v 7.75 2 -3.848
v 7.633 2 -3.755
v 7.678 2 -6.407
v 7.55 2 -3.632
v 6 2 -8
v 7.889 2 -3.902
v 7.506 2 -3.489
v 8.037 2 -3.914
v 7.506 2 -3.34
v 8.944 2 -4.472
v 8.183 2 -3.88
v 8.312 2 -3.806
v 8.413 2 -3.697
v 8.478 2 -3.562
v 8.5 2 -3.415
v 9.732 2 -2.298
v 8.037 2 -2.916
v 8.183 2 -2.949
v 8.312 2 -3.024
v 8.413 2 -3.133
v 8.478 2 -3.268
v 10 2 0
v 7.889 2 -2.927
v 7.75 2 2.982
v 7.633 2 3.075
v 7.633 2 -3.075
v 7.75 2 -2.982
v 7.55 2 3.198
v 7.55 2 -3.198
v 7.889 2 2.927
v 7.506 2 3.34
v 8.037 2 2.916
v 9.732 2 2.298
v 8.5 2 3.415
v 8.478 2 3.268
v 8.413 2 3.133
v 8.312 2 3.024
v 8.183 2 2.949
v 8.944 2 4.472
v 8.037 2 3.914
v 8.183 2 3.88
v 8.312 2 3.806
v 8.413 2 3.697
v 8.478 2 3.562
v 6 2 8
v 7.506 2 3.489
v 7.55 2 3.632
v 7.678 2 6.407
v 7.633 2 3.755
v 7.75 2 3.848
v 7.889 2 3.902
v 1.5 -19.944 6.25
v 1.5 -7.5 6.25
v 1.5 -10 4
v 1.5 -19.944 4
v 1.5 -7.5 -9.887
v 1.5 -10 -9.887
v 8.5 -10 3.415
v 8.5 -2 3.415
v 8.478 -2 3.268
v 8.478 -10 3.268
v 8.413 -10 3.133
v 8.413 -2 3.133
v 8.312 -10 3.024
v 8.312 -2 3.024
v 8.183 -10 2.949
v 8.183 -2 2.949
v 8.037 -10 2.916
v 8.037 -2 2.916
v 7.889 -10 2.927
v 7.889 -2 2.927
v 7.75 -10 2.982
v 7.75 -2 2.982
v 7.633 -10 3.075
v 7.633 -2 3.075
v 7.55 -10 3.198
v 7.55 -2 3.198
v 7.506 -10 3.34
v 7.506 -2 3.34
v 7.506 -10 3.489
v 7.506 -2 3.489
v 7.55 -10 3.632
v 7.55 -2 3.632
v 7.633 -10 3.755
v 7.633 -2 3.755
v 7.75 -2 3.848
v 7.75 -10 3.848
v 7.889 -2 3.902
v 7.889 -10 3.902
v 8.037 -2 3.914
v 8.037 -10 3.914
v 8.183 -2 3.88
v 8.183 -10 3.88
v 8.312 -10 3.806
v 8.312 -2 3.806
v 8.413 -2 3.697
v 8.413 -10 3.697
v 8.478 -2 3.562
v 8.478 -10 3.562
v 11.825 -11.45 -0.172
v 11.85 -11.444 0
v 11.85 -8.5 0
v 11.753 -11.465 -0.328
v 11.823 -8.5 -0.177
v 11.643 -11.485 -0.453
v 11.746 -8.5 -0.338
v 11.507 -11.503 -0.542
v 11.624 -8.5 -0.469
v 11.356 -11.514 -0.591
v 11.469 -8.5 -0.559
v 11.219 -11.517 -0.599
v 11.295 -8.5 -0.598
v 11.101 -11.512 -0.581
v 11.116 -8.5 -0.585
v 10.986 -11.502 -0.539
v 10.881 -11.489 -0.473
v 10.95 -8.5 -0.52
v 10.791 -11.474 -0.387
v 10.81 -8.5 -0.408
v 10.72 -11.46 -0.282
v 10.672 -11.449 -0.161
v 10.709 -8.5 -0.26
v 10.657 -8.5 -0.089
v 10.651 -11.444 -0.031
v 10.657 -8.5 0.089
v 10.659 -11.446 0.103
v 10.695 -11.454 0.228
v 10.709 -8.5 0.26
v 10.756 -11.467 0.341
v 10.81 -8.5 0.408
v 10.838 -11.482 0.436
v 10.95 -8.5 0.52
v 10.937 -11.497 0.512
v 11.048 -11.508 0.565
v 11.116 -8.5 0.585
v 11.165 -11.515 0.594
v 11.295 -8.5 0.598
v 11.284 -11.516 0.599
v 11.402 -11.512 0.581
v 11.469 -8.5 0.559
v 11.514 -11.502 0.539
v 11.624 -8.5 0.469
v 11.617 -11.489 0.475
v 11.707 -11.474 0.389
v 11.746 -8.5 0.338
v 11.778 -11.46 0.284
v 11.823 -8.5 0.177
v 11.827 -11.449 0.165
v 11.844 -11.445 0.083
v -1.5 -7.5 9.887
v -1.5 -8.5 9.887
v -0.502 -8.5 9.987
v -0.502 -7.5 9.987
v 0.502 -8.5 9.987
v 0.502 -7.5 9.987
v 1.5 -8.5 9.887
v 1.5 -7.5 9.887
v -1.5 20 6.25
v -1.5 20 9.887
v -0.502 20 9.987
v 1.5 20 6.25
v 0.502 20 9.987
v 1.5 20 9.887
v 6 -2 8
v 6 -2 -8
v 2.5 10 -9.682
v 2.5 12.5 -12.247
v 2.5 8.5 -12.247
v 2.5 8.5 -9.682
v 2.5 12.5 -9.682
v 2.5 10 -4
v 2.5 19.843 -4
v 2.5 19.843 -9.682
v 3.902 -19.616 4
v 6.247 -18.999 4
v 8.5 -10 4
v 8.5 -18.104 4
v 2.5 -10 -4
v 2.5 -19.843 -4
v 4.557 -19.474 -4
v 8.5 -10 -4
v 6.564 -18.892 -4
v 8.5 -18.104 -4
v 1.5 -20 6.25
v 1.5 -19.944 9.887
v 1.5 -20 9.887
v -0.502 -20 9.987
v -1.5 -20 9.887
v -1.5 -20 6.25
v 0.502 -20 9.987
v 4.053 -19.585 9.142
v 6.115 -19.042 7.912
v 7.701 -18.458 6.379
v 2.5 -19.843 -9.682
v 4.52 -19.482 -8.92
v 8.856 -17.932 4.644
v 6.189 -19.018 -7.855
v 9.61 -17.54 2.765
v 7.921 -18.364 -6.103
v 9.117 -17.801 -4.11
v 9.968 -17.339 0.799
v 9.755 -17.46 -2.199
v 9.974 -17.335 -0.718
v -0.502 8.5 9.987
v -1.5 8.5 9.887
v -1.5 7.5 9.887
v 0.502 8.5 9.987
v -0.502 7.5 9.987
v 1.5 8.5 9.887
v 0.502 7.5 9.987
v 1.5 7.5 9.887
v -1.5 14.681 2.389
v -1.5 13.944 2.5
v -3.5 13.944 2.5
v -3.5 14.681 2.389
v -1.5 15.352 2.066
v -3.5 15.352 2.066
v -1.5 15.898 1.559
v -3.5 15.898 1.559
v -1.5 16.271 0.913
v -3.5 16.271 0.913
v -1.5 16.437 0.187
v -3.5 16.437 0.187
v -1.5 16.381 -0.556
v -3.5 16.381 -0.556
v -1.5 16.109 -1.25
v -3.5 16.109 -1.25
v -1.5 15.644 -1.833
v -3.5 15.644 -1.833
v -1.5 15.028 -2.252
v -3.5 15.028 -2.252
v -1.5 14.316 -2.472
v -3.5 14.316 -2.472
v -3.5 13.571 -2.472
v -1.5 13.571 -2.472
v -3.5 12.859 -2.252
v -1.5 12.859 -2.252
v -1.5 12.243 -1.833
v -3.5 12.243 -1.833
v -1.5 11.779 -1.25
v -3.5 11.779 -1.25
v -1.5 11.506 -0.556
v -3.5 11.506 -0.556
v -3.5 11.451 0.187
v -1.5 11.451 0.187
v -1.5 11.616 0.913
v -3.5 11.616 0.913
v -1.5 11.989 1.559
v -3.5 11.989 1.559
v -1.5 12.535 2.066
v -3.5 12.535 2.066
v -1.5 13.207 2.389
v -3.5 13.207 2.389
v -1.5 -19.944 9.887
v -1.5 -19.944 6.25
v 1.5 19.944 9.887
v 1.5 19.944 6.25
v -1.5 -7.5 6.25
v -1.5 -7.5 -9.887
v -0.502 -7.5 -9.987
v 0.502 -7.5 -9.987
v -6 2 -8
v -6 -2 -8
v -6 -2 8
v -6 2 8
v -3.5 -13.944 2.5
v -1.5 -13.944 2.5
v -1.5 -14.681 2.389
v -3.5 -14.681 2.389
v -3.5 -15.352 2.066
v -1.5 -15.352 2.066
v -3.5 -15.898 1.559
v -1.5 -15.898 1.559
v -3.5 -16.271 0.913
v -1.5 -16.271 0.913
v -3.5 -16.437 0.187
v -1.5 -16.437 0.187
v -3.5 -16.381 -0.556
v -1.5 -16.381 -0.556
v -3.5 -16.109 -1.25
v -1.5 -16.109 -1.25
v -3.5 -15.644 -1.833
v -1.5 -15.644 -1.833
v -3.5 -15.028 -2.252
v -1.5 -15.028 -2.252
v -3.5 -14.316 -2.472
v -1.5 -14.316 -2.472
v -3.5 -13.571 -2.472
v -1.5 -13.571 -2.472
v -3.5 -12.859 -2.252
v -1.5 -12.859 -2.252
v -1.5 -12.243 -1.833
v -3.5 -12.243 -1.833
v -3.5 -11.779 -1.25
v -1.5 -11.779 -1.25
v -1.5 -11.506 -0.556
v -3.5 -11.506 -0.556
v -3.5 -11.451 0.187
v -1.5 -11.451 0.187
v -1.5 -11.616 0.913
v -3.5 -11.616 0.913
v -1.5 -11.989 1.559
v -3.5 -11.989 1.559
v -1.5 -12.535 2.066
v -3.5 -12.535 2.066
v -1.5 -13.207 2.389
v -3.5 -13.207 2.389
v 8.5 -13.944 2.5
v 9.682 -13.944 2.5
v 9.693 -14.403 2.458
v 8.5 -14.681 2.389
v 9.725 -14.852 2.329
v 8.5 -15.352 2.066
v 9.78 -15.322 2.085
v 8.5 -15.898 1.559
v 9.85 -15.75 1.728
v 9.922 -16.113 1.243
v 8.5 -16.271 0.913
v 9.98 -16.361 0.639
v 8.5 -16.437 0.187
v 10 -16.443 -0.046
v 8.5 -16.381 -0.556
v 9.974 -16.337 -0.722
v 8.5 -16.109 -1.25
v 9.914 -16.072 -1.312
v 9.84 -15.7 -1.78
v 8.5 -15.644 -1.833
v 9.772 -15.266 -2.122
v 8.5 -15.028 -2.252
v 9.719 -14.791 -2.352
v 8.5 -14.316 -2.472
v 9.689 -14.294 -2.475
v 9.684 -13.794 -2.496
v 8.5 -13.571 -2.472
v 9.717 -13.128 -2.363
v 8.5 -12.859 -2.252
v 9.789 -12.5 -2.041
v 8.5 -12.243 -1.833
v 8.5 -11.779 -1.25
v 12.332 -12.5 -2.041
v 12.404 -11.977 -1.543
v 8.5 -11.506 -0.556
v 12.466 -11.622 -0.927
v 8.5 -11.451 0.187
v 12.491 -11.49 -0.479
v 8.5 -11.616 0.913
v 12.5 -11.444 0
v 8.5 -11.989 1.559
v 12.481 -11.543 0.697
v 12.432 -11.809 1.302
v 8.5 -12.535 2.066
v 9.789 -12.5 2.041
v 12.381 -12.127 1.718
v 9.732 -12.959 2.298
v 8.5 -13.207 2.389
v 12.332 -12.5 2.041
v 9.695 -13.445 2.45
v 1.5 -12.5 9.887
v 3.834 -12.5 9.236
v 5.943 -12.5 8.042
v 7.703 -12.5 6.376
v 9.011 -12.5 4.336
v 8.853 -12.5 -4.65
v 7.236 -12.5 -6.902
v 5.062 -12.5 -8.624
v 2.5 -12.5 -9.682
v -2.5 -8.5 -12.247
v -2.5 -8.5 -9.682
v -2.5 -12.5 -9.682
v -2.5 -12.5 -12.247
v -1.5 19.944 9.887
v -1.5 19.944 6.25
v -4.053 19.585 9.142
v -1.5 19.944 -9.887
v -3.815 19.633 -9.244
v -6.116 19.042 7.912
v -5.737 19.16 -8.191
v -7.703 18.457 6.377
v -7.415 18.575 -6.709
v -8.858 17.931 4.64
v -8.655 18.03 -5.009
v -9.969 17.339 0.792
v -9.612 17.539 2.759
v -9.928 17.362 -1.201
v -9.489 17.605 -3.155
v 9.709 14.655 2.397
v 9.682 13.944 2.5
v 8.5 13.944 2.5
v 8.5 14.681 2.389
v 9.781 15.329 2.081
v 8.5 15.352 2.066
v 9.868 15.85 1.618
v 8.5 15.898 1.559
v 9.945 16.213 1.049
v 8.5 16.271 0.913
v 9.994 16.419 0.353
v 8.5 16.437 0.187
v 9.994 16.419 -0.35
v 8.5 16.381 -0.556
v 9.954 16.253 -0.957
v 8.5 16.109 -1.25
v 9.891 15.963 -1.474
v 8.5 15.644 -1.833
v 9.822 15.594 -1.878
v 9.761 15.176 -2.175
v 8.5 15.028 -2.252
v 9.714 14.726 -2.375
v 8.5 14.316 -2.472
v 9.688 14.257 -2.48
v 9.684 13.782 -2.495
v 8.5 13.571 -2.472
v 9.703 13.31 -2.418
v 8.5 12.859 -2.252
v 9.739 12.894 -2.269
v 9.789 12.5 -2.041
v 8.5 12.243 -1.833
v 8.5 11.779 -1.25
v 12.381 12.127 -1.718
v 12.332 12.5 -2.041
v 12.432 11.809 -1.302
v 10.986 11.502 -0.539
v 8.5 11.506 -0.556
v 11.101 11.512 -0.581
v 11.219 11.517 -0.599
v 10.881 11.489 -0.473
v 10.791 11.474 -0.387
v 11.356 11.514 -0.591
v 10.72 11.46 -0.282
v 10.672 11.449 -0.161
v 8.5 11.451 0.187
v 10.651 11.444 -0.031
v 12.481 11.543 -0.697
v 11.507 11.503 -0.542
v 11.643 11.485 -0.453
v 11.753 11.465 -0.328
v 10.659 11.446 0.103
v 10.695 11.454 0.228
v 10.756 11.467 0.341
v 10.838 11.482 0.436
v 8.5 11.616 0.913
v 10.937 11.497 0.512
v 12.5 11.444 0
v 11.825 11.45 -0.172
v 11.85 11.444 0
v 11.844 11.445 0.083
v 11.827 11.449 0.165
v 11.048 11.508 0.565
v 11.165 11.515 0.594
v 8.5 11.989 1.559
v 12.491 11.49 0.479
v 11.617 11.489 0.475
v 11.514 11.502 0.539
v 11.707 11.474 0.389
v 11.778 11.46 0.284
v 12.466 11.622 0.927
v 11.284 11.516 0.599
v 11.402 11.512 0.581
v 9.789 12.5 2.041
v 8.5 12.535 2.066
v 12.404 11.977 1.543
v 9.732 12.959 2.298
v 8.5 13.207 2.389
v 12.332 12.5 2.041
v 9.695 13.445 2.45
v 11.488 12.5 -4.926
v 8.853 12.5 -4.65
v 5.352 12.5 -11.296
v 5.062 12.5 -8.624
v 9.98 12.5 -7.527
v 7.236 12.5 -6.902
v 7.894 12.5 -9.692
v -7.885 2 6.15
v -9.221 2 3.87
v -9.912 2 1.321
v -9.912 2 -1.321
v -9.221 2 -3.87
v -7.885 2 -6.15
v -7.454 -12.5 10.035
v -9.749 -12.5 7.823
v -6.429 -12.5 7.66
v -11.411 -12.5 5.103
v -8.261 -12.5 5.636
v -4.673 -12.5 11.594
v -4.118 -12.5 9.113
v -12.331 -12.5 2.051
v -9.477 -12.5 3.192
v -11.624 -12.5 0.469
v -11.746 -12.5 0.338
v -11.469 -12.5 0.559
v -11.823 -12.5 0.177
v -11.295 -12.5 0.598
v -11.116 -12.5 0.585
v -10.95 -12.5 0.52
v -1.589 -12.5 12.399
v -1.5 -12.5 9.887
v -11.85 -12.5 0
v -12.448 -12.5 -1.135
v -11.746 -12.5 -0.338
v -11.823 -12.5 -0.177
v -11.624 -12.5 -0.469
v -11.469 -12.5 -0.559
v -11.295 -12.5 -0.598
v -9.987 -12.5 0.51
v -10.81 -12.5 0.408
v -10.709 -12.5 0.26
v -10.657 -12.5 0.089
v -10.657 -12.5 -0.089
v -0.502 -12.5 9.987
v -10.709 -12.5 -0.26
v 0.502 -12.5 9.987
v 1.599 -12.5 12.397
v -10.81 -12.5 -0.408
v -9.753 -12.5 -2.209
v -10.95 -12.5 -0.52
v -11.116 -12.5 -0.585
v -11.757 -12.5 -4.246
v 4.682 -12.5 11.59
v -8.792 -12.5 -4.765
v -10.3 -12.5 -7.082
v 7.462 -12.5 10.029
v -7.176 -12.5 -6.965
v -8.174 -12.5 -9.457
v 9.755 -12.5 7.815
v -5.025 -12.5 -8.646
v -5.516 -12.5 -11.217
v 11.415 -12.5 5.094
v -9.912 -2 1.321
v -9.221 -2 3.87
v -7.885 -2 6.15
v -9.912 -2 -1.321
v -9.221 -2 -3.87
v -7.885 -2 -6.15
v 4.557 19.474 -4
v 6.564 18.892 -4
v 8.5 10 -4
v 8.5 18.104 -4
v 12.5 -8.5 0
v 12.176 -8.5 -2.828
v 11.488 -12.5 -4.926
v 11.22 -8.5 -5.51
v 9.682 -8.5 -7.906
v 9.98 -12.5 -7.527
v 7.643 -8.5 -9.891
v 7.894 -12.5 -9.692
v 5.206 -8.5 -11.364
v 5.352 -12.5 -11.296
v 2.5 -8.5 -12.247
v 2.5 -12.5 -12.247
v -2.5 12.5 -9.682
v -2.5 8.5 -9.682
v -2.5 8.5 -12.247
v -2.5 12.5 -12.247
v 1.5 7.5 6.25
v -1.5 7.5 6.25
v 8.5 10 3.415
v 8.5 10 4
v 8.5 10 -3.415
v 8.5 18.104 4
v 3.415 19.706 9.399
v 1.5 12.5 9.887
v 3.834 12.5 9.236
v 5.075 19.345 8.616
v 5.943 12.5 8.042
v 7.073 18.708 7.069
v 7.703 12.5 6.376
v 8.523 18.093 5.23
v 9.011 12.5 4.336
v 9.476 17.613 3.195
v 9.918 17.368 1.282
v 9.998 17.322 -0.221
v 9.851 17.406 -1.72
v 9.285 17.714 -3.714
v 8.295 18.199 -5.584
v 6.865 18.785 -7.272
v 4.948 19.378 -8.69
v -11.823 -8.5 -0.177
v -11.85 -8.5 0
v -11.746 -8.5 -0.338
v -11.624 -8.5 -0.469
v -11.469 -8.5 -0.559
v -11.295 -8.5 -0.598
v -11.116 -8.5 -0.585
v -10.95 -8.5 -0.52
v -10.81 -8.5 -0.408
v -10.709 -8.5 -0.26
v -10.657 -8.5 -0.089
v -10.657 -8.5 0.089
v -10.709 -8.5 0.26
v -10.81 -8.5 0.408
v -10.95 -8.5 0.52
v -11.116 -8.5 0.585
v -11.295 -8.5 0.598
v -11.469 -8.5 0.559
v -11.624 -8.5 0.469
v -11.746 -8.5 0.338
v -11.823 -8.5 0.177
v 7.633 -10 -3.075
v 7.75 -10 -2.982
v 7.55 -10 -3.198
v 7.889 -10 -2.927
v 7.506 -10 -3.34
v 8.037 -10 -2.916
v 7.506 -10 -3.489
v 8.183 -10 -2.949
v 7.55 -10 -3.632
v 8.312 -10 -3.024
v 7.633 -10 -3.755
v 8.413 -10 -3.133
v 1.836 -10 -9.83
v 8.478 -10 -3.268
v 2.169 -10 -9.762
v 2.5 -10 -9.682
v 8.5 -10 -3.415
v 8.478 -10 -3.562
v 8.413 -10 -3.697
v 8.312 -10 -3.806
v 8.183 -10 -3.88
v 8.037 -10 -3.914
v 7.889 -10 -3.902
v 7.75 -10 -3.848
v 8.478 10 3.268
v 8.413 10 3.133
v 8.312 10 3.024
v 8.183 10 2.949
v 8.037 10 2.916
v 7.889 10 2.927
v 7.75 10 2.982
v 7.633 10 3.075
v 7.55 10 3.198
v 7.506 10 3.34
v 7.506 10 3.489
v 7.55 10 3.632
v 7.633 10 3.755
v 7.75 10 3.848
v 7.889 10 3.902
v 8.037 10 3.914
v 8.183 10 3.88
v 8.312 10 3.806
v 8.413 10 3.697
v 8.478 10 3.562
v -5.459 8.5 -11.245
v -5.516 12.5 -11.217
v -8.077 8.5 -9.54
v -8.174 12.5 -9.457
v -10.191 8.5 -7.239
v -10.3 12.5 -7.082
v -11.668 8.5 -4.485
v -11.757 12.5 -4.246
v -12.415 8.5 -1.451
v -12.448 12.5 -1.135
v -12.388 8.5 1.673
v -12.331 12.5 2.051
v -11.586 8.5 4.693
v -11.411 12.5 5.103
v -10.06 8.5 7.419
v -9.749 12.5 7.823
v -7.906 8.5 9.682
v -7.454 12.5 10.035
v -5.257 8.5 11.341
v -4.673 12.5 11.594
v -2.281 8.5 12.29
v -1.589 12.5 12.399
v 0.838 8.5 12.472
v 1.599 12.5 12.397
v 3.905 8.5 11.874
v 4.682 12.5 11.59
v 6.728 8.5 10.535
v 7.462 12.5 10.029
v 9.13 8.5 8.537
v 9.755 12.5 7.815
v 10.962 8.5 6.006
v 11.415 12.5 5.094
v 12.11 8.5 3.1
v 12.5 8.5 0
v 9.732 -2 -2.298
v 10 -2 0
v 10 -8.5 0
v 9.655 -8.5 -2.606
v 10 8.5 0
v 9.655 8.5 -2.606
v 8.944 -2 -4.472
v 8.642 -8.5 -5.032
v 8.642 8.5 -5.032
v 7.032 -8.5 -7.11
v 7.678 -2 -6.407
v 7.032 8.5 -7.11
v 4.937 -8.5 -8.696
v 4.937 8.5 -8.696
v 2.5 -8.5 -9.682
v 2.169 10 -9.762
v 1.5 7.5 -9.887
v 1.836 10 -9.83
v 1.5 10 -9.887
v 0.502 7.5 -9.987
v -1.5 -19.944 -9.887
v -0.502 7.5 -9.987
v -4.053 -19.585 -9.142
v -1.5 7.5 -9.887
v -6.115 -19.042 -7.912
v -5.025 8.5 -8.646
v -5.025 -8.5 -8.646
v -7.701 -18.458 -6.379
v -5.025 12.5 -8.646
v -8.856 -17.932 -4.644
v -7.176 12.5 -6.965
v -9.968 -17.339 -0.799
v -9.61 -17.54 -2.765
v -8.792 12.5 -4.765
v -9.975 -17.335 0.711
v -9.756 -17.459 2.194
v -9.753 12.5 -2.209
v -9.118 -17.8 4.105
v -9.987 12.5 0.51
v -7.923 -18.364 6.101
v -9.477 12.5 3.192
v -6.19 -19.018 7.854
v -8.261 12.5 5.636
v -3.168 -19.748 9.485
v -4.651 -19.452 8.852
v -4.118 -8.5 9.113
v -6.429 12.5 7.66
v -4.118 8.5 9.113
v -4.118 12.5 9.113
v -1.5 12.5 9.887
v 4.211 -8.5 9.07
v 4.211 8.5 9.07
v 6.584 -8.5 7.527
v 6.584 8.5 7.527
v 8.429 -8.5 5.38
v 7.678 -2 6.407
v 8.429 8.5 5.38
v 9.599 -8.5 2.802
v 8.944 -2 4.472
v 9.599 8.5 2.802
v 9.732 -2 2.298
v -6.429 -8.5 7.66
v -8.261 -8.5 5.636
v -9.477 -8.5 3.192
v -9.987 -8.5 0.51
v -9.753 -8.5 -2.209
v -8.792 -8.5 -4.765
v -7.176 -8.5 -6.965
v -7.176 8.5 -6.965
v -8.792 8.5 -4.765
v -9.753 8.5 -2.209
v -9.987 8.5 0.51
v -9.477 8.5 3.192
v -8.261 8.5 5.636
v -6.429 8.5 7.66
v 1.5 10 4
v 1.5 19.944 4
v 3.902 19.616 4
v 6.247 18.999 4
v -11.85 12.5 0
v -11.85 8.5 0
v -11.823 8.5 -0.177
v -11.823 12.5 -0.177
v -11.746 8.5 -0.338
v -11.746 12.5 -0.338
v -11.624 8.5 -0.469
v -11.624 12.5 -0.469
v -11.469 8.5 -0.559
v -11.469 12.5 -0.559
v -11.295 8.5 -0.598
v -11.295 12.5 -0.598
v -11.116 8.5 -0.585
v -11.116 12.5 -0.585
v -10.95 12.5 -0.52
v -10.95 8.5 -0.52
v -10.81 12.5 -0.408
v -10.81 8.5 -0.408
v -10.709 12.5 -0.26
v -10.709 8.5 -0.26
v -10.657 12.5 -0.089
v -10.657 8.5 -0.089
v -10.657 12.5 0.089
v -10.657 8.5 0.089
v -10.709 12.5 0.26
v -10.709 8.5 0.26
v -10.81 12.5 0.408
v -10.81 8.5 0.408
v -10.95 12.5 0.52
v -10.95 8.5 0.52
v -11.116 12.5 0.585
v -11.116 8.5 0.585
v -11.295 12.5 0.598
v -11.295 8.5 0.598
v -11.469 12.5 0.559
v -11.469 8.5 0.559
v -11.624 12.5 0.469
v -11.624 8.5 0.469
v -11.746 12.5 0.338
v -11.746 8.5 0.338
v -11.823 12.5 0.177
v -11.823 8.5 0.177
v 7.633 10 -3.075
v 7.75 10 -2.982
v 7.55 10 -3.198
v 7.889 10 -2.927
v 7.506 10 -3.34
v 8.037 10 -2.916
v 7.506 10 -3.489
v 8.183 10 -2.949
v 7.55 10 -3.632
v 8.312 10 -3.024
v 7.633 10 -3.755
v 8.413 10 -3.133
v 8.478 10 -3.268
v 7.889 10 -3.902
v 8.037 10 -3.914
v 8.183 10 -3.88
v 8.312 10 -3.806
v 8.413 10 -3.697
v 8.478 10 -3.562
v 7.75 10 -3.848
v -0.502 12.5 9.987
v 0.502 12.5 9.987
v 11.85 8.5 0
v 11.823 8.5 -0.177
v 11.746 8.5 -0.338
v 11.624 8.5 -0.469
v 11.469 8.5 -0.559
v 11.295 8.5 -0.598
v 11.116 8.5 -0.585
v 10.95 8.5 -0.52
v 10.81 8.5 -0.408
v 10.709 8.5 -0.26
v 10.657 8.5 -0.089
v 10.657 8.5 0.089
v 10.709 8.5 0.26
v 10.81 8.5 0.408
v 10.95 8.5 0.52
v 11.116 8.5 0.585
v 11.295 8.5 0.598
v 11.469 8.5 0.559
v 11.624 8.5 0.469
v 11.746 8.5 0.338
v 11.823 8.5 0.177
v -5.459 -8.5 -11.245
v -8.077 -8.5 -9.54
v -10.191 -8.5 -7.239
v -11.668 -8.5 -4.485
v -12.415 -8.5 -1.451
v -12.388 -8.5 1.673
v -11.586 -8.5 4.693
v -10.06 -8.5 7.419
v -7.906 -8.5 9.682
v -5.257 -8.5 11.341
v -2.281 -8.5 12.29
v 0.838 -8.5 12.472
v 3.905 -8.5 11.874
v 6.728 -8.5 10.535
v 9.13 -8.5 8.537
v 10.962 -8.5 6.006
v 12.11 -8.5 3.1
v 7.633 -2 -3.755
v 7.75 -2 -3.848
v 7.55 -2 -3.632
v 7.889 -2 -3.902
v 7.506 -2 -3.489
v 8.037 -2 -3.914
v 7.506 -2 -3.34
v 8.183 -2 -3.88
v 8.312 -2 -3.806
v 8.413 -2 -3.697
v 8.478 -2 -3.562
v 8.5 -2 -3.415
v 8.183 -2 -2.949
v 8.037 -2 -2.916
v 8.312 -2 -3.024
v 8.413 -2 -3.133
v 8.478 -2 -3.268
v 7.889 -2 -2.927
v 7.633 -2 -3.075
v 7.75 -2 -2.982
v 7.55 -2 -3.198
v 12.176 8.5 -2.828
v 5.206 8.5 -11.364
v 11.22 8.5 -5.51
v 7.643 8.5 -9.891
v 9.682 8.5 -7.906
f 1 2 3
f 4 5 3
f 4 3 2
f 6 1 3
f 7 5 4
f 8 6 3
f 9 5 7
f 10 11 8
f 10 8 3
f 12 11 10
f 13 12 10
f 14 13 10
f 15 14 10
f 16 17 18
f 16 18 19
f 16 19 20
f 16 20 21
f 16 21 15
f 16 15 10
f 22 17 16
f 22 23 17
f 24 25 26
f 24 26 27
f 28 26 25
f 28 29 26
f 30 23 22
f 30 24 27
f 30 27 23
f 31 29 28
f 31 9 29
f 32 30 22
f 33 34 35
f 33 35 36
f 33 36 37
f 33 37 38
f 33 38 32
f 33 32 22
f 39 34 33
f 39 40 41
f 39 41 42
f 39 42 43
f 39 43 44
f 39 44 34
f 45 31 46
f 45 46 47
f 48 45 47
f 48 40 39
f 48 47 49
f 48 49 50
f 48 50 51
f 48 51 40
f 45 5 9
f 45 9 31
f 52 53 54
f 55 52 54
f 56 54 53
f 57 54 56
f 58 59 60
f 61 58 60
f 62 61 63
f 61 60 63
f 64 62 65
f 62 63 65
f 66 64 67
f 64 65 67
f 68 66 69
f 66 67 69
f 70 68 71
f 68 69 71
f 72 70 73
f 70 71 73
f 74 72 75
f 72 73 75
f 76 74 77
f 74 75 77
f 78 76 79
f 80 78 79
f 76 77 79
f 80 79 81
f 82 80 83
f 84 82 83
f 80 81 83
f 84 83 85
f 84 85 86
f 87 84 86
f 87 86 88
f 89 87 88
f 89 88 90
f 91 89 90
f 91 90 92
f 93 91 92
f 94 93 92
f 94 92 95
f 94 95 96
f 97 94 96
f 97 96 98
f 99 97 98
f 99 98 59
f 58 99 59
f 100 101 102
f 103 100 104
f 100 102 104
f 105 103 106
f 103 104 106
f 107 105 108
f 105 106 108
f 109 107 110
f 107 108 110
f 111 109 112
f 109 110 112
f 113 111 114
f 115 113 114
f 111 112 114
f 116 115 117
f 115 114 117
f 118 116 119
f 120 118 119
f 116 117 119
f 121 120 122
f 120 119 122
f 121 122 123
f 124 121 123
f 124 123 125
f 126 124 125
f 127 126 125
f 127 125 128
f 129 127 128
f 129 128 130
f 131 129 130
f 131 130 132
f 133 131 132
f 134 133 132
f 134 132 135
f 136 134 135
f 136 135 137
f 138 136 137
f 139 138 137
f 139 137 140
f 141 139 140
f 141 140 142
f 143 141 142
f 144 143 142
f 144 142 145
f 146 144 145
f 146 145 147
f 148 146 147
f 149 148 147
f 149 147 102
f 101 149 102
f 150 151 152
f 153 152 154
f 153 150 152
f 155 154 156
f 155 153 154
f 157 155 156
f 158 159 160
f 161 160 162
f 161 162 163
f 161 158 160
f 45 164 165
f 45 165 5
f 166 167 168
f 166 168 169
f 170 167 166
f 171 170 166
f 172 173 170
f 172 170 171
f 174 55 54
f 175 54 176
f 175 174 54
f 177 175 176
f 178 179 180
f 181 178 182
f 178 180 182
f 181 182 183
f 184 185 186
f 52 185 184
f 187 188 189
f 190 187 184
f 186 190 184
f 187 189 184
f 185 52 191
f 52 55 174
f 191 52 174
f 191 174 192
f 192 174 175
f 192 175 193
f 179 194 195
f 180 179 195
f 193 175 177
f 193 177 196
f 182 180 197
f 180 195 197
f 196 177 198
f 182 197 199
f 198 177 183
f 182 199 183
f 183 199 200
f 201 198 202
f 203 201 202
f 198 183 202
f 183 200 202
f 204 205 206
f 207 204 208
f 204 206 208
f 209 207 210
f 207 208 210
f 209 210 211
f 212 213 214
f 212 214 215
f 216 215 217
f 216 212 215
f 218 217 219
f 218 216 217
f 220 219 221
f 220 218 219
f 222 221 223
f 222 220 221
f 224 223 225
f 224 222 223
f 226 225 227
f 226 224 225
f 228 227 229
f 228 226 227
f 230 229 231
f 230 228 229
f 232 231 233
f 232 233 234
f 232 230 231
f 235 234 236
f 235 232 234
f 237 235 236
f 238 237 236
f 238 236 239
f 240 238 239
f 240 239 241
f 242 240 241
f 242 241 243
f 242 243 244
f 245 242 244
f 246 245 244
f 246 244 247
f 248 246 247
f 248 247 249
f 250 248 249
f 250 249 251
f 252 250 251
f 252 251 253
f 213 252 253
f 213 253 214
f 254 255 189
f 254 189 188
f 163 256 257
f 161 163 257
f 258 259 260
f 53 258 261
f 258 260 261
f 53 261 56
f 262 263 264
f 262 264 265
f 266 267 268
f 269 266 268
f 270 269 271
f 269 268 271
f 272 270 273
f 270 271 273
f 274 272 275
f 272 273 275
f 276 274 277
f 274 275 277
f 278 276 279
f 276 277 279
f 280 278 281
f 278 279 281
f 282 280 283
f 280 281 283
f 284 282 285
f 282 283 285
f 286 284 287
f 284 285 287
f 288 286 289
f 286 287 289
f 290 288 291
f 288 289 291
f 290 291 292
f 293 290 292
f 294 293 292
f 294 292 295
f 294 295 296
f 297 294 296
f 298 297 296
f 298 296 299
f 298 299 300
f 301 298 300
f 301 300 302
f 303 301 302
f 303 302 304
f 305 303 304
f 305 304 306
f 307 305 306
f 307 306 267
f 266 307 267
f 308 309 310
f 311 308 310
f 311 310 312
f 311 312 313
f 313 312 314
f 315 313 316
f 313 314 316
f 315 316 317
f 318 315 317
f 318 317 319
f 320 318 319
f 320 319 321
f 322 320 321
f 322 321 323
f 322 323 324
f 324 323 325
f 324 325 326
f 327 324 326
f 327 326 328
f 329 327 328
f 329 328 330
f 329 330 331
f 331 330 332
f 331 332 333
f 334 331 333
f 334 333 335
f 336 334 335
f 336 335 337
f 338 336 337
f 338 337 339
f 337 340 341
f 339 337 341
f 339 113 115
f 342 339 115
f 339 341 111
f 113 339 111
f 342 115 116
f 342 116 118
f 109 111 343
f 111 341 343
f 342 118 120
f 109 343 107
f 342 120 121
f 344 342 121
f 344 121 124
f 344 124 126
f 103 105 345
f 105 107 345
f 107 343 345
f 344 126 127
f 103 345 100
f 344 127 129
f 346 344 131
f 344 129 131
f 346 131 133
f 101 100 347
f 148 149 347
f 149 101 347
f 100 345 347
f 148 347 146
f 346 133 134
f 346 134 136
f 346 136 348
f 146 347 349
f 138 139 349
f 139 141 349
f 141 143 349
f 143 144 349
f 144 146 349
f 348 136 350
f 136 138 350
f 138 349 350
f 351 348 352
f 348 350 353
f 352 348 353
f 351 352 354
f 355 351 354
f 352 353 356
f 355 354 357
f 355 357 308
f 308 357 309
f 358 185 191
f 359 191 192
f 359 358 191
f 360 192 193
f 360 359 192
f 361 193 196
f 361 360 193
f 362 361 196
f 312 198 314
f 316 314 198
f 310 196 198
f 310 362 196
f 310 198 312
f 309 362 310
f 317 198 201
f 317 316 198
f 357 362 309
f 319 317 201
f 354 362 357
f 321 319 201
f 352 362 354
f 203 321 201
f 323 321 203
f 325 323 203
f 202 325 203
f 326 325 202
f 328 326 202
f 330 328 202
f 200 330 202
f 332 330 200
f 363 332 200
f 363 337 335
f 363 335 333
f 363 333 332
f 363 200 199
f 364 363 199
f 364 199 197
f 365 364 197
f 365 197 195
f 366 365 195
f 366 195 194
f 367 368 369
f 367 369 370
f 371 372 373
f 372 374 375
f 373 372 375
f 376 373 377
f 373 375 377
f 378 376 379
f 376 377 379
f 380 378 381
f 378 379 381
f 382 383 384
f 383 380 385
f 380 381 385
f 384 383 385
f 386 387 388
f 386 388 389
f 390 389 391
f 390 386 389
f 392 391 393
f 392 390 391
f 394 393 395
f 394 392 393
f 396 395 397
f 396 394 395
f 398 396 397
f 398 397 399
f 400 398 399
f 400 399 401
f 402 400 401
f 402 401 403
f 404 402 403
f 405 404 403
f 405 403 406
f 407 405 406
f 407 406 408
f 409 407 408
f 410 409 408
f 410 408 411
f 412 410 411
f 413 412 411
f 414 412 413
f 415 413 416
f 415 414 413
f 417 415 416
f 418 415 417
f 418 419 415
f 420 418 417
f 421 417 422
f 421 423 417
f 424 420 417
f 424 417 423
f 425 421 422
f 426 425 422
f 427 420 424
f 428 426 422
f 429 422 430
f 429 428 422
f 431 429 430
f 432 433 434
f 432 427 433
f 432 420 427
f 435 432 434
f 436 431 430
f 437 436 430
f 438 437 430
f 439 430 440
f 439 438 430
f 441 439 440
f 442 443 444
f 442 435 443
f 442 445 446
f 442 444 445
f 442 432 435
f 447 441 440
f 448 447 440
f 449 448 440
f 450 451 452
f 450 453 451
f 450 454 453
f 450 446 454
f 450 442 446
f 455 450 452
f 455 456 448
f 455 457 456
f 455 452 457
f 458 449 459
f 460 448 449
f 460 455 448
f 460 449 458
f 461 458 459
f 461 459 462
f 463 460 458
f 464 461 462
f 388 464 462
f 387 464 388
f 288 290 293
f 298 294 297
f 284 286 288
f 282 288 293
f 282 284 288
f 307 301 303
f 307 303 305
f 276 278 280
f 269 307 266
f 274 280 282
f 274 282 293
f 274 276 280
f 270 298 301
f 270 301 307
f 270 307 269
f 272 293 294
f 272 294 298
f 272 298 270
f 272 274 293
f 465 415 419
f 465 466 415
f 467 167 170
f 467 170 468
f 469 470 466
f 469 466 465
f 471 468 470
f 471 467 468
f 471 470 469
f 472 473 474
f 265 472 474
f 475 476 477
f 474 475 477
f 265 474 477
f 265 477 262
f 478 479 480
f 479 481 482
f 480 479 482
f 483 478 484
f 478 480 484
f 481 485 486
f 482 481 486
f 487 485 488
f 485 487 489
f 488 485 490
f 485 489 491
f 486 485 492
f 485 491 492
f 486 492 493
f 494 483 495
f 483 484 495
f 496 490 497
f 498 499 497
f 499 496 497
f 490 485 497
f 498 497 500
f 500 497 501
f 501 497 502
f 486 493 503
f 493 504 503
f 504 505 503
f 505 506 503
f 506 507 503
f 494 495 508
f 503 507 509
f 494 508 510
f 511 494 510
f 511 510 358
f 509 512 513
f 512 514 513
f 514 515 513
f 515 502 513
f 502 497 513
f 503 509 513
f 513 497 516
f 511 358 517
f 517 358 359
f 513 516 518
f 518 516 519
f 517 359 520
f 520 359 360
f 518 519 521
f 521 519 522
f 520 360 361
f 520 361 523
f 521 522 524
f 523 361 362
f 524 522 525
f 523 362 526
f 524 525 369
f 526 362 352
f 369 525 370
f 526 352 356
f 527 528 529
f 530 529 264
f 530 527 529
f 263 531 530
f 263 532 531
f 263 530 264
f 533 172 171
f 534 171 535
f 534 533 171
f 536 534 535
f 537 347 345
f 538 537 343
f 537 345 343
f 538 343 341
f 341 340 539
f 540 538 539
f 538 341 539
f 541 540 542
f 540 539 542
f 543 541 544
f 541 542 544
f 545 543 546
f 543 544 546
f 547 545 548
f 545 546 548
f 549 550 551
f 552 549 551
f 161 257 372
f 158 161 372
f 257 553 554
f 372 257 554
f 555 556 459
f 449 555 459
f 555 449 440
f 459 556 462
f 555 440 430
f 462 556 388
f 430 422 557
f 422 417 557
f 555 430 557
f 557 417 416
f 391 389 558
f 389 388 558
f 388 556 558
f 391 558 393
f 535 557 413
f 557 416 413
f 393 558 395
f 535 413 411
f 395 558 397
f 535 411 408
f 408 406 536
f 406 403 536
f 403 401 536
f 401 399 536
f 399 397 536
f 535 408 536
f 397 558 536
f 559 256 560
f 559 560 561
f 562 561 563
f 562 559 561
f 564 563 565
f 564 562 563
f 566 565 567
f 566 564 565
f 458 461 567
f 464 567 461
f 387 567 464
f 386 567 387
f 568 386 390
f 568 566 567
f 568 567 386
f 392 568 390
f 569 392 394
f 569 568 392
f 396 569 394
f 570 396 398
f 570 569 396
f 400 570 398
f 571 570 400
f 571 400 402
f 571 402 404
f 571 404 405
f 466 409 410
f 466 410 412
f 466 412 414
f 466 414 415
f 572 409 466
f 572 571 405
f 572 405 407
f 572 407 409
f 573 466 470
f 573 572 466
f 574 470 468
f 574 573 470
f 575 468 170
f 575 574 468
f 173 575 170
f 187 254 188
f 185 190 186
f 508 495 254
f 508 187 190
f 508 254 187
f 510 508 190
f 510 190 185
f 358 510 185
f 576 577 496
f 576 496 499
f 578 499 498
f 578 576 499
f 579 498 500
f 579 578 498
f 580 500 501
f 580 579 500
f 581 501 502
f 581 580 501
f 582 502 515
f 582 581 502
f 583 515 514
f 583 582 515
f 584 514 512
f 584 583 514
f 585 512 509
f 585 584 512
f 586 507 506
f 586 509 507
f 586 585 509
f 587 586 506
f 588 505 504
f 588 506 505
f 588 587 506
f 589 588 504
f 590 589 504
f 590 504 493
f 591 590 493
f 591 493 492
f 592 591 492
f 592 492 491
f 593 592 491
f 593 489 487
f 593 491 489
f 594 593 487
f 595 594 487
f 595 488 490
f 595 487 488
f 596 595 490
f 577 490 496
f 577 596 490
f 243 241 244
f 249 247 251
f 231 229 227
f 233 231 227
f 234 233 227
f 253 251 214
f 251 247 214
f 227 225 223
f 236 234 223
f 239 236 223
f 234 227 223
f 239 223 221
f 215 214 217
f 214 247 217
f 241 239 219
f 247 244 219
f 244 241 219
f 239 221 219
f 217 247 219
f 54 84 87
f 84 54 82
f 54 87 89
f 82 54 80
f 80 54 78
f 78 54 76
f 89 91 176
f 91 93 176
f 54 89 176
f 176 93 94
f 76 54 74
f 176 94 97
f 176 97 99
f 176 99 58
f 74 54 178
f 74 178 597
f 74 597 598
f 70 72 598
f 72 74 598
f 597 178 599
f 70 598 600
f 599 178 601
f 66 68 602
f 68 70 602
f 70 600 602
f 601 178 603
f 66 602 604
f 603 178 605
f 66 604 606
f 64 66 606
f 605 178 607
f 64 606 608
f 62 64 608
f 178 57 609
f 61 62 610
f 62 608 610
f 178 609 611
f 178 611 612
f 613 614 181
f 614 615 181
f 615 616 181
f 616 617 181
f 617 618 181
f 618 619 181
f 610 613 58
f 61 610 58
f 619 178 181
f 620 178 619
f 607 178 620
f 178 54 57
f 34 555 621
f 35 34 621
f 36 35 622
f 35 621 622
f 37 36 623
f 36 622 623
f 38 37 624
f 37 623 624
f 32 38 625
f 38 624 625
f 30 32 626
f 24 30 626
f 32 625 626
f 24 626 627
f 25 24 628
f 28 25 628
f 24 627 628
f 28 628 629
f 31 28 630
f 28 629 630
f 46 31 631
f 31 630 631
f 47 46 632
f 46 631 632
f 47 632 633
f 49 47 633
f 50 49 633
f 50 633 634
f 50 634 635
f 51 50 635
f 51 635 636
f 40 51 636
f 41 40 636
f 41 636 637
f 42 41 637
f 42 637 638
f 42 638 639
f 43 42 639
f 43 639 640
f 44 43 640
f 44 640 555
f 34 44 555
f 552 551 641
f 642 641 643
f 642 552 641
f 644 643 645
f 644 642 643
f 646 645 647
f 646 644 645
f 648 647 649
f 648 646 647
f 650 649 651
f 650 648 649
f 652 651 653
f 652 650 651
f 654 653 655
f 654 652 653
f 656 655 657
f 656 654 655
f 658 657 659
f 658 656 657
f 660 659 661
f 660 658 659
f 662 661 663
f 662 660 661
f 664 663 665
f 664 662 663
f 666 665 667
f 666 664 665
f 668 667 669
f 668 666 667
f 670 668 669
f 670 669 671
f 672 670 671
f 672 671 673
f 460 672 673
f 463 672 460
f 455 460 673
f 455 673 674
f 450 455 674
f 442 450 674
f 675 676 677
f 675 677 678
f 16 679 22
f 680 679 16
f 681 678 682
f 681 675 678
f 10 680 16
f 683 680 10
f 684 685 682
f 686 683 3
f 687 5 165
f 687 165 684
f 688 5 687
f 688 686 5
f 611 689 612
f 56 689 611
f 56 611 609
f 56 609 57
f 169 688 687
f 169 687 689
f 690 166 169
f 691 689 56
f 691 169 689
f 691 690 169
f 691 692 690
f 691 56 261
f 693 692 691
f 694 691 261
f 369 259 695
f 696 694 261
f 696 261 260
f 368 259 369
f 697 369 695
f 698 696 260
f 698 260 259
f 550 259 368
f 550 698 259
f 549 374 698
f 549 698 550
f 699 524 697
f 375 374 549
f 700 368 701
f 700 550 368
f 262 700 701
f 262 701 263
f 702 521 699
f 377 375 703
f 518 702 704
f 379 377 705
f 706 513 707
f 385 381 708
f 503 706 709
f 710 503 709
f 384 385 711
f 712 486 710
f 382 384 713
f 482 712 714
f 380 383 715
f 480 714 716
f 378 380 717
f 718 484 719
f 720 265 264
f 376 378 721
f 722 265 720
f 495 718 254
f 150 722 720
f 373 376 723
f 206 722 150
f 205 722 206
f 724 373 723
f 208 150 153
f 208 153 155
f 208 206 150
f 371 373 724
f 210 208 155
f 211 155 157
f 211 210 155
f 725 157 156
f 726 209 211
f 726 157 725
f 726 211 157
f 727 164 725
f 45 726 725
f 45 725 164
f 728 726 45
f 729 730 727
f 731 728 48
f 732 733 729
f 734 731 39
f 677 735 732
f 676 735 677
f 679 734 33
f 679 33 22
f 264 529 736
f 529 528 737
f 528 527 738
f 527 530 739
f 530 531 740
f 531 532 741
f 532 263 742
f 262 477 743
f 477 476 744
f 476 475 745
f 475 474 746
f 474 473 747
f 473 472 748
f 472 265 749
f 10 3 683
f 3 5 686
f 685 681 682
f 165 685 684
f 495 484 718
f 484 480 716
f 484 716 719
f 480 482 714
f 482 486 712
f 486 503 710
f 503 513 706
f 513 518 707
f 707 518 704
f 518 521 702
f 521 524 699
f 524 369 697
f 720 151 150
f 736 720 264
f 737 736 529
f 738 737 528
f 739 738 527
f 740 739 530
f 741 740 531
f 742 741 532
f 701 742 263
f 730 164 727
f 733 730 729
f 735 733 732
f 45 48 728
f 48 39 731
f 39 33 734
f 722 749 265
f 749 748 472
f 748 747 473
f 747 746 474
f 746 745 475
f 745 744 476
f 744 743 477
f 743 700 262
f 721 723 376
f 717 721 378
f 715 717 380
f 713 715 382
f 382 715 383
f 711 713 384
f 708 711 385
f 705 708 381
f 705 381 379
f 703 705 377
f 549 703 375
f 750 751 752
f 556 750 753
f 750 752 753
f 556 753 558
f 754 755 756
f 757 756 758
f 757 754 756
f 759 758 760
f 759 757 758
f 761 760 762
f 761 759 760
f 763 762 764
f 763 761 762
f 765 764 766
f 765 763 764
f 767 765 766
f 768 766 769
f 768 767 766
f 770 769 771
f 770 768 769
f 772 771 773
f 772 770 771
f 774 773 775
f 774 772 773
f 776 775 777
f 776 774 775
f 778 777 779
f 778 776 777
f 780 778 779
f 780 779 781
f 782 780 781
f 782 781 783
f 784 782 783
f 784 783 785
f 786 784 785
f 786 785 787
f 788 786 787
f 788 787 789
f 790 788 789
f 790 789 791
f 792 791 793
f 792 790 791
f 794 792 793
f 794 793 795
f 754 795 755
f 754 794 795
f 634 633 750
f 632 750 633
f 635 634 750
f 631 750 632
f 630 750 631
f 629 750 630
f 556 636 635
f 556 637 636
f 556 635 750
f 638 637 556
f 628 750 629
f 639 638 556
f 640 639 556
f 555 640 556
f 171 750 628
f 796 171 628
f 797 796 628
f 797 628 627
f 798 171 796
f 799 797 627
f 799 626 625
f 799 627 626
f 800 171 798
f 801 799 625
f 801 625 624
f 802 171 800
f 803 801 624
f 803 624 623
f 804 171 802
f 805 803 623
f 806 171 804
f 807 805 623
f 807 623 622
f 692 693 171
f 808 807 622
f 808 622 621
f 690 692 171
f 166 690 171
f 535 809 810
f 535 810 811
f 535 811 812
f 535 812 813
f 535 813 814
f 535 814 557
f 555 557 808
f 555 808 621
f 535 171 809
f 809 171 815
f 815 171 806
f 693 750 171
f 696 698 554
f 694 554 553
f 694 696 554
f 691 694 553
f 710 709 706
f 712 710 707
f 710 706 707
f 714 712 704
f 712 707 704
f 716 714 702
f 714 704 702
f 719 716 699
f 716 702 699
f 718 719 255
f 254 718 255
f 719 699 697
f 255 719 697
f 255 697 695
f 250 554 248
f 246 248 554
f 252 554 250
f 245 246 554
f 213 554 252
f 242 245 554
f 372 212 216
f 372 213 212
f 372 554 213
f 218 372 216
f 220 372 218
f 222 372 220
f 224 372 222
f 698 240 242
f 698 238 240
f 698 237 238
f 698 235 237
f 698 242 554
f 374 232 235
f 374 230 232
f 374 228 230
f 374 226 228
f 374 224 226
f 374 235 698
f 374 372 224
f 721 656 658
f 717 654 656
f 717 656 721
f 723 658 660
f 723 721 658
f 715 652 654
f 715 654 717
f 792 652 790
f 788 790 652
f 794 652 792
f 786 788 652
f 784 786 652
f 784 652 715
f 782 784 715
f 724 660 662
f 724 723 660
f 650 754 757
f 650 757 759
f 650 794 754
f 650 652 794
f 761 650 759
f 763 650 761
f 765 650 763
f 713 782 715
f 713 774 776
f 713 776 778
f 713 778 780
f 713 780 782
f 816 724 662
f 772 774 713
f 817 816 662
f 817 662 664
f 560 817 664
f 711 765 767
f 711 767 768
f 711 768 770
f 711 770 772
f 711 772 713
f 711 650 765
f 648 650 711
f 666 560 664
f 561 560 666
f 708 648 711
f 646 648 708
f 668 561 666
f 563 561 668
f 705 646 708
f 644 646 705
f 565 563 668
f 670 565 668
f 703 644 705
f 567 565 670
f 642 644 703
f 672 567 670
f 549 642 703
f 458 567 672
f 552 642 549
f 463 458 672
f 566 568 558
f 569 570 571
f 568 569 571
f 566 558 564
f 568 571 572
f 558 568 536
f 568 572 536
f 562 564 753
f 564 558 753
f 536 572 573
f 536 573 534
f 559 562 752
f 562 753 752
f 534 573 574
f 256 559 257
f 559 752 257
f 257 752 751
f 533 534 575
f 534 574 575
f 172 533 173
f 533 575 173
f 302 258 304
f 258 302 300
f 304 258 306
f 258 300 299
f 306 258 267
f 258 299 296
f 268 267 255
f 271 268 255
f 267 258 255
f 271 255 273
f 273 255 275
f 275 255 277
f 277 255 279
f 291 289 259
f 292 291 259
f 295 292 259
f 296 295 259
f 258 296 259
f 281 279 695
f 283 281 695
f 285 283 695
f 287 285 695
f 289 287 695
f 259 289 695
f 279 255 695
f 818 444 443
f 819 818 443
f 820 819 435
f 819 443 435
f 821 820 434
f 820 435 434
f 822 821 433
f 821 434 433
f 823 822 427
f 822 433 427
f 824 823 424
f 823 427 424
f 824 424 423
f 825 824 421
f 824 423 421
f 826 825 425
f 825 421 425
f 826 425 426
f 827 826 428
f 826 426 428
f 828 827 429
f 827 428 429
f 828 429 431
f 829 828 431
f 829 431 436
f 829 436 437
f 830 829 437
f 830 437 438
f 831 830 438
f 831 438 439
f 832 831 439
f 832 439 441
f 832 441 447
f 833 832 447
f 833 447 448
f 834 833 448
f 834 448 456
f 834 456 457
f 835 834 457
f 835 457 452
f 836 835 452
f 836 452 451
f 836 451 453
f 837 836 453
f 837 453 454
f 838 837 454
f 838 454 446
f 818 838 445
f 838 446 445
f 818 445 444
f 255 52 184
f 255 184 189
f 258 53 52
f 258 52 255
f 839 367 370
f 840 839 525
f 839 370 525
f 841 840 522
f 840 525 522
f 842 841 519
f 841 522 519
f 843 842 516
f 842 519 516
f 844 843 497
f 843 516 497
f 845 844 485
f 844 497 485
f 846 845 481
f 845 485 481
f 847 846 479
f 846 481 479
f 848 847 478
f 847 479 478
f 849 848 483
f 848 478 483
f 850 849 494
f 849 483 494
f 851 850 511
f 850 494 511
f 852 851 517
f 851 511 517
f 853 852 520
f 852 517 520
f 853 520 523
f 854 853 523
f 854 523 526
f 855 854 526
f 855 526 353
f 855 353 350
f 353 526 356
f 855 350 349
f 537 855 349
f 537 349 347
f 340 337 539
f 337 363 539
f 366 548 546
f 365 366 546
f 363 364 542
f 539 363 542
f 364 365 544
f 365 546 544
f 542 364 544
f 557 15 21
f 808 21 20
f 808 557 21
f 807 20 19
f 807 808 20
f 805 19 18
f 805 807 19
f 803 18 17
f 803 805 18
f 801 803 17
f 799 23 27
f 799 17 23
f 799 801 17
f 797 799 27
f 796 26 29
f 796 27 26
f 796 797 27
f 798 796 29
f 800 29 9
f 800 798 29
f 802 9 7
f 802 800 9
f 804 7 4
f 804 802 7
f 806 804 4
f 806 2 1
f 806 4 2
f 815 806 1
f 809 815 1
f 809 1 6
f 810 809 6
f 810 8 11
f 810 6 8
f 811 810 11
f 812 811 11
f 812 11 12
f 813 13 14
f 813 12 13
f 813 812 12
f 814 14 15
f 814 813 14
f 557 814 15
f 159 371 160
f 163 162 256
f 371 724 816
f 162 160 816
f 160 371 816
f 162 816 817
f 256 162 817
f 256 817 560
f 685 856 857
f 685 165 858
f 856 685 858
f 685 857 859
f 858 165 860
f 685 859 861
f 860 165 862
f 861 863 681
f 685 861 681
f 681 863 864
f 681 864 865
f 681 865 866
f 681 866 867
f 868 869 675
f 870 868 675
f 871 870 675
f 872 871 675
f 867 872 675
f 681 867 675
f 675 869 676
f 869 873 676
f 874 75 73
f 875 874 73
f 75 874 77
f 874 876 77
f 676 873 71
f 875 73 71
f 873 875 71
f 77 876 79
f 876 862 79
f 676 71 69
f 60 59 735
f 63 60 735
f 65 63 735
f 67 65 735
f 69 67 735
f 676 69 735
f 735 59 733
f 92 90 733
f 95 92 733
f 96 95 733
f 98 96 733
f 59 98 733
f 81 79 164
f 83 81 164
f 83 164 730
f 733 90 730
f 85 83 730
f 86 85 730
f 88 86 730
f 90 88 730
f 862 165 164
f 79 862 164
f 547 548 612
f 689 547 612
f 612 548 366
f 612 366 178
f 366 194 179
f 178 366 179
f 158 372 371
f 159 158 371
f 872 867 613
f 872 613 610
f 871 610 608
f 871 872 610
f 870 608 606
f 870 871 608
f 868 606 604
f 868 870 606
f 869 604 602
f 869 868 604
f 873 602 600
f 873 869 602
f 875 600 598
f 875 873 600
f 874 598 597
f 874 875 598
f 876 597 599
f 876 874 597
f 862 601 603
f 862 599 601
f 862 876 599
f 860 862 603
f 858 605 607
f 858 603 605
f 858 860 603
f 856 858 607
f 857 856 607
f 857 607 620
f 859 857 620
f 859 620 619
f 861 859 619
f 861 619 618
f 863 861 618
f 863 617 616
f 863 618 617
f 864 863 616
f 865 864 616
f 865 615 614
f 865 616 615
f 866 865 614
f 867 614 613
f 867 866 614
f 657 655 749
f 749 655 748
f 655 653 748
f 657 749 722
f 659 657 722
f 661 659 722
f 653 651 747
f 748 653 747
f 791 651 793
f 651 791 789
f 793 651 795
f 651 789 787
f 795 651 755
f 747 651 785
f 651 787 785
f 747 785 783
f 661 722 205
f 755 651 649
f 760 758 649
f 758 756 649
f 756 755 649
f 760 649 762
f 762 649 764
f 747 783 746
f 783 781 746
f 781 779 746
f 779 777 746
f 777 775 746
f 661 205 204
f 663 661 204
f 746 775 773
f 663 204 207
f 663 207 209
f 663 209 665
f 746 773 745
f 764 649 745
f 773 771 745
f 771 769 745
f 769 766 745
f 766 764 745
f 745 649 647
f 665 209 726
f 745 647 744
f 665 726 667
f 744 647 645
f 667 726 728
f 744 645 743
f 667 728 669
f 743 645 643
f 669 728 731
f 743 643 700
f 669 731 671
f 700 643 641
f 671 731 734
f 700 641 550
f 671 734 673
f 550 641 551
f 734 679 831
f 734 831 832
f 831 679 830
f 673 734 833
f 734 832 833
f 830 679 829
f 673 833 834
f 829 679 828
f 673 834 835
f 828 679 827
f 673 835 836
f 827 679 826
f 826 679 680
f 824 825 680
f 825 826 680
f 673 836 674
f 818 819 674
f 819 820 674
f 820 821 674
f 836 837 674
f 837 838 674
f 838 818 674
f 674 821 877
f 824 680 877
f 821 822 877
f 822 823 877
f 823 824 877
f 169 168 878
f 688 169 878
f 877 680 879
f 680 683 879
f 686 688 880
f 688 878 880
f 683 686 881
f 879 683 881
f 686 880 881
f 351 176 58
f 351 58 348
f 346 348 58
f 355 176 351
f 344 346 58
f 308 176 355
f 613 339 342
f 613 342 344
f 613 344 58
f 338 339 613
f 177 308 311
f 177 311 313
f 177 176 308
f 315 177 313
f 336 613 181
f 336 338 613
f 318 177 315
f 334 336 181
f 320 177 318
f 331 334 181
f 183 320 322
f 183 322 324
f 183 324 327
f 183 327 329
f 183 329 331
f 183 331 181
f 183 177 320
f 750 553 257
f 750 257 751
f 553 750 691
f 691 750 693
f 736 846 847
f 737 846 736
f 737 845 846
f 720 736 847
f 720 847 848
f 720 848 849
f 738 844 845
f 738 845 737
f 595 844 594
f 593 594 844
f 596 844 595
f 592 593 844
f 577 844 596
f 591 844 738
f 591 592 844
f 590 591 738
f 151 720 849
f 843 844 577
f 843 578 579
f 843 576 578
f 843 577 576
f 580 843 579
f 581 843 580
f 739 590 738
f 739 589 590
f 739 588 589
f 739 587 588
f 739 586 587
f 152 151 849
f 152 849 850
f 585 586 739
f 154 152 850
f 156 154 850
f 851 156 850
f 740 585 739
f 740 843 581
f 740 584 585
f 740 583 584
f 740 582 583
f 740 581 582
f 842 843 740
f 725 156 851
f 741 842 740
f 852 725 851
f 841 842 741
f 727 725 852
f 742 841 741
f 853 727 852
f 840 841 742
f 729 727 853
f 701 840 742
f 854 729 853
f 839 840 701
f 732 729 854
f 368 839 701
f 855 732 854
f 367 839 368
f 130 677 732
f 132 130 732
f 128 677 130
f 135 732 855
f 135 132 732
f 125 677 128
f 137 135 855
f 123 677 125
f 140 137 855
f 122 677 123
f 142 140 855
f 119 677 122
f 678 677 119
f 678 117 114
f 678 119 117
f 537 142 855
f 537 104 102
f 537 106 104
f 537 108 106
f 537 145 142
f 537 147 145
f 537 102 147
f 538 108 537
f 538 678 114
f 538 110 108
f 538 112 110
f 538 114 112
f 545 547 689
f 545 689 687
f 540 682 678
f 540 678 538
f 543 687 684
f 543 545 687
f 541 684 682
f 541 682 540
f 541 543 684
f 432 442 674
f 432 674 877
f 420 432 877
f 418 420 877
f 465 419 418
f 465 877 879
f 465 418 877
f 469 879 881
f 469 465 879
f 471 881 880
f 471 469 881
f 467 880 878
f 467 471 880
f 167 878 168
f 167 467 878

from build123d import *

# Parameters (mm, degrees)
SKETCH1_R           = 10
BOSS_EXTRUDE1_DEPTH = 20
SKETCH2_R           = 24.856075314
SKETCH2_R_2         = 20
CUT_EXTRUDE3_DEPTH  = 20
SKETCH5_W           = 3
SKETCH5_H           = 20
CUT_EXTRUDE4_DEPTH  = 10
CUT_EXTRUDE5_START  = -20
SKETCH6_R           = 2.5
CUT_EXTRUDE5_DEPTH  = 25
SKETCH7_W           = 7
SKETCH7_H           = 8
CUT_EXTRUDE7_DEPTH  = 10
SKETCH8_R           = 0.5
CUT_EXTRUDE8_DEPTH  = 30
SKETCH9_W           = 2
SKETCH9_H           = 7.475145823
CUT_EXTRUDE9_DEPTH  = 23
SKETCH10_W          = 3
SKETCH10_H          = 24.206915905
CUT_EXTRUDE10_DEPTH = 2.5
SKETCH12_W          = 4
SKETCH12_H          = 4
CUT_EXTRUDE12_DEPTH = 15
BOSS_EXTRUDE7_DEPTH = 4
SKETCH39_R          = 2.5
CUT_EXTRUDE15_DEPTH = 12.5
BOSS_EXTRUDE8_DEPTH = 12.5
SKETCH42_R          = 0.6
CUT_EXTRUDE16_DEPTH = 33.5


with BuildPart() as part:
    # Sketch1 → Boss-Extrude1 (new body, symmetric)
    with BuildSketch(Plane(origin=(0, 0, 0), x_dir=(1, 0, 0), z_dir=(0, 1, 0))):
        Circle(SKETCH1_R)
    extrude(amount=BOSS_EXTRUDE1_DEPTH, both=True)

    # Sketch2 → Cut-Extrude3 (cut, symmetric)
    with BuildSketch(Plane.XY):
        Circle(SKETCH2_R)
        Circle(SKETCH2_R_2, mode=Mode.SUBTRACT)
    cut_extrude3 = extrude(amount=CUT_EXTRUDE3_DEPTH, both=True, mode=Mode.SUBTRACT)

    # Sketch5 → Cut-Extrude4 (cut)
    with BuildSketch(Plane(origin=(0, 20, 0), x_dir=(1, 0, 0), z_dir=(0, 1, 0))):
        Rectangle(SKETCH5_W, SKETCH5_H)
    cut_extrude4 = extrude(amount=-CUT_EXTRUDE4_DEPTH, mode=Mode.SUBTRACT)

    # Sketch6 → Cut-Extrude5 (cut)
    with BuildSketch(Plane.ZY.offset(-1.5).offset(CUT_EXTRUDE5_START)):
        with Locations((0, 13.943670675)):
            Circle(SKETCH6_R)
    cut_extrude5 = extrude(amount=CUT_EXTRUDE5_DEPTH, mode=Mode.SUBTRACT)

    # Sketch7 → Cut-Extrude7 (cut)
    with BuildSketch(Plane(origin=(0, 20, 0), x_dir=(1, 0, 0), z_dir=(0, 1, 0))):
        with Locations((5, 0)):
            Rectangle(SKETCH7_W, SKETCH7_H)
    cut_extrude7 = extrude(amount=-CUT_EXTRUDE7_DEPTH, mode=Mode.SUBTRACT)

    # Sketch8 → Cut-Extrude8 (cut)
    with BuildSketch(Plane(origin=(0, 10, 0), x_dir=(1, 0, 0), z_dir=(0, 1, 0))):
        with Locations((8, -3.414911062)):
            Circle(SKETCH8_R)
    cut_extrude8 = extrude(amount=-CUT_EXTRUDE8_DEPTH, mode=Mode.SUBTRACT)

    # Sketch9 → Cut-Extrude9 (cut)
    with BuildSketch(Plane(origin=(0, 10, 0), x_dir=(1, 0, 0), z_dir=(0, 1, 0))):
        with Locations((1.5, 7.737572912)):
            Rectangle(SKETCH9_W, SKETCH9_H)
    cut_extrude9 = extrude(amount=CUT_EXTRUDE9_DEPTH, mode=Mode.SUBTRACT)

    # Mirror2: Cut-Extrude3, Cut-Extrude4, Cut-Extrude5, Cut-Extrude7, Cut-Extrude8, Cut-Extrude9 across plane
    add(cut_extrude3.mirror(Plane.ZX), mode=Mode.SUBTRACT)
    add(cut_extrude4.mirror(Plane.ZX), mode=Mode.SUBTRACT)
    add(cut_extrude5.mirror(Plane.ZX), mode=Mode.SUBTRACT)
    add(cut_extrude7.mirror(Plane.ZX), mode=Mode.SUBTRACT)
    add(cut_extrude8.mirror(Plane.ZX), mode=Mode.SUBTRACT)
    add(cut_extrude9.mirror(Plane.ZX), mode=Mode.SUBTRACT)

    # Mirror3: Cut-Extrude8 across plane
    add(cut_extrude8.mirror(Plane.XY), mode=Mode.SUBTRACT)

    # Sketch10 → Cut-Extrude10 (cut)
    with BuildSketch(Plane(origin=(0, 10, 0), x_dir=(1, 0, 0), z_dir=(0, 1, 0))):
        with Locations((0, 0.041148578)):
            Rectangle(SKETCH10_W, SKETCH10_H)
    cut_extrude10 = extrude(amount=-CUT_EXTRUDE10_DEPTH, mode=Mode.SUBTRACT)

    # Mirror4: Cut-Extrude10 across plane
    add(cut_extrude10.mirror(Plane.ZX), mode=Mode.SUBTRACT)

    # Sketch12 → Cut-Extrude12 (cut, symmetric)
    with BuildSketch(Plane.XY):
        with Locations((-8, 0)):
            Rectangle(SKETCH12_W, SKETCH12_H)
        with Locations((8, 0)):
            Rectangle(SKETCH12_W, SKETCH12_H)
    extrude(amount=CUT_EXTRUDE12_DEPTH, both=True, mode=Mode.SUBTRACT)

    # Sketch37 → Boss-Extrude7 (add)
    with BuildSketch(Plane(origin=(0, 12.5, 0), x_dir=(1, 0, 0), z_dir=(0, 1, 0))):
        with BuildLine():
            Line((-2.5, 9.682458366), (-2.5, 12.247448714))
            ThreePointArc((-2.5, 12.247448714), (-7.90569415, -9.682458366), (12.5, 0))
            ThreePointArc((12.5, 0), (9.682458366, 7.90569415), (2.5, 12.247448714))
            Line((2.5, 12.247448714), (2.5, 9.682458366))
            ThreePointArc((2.5, 9.682458366), (7.90569415, 6.123724357), (10, 0))
            ThreePointArc((10, 0), (-6.123724357, -7.90569415), (-2.5, 9.682458366))
        make_face()
    boss_extrude7 = extrude(amount=-BOSS_EXTRUDE7_DEPTH)

    # Mirror5: Boss-Extrude7 across plane
    add(boss_extrude7.mirror(Plane.ZX))

    # Sketch39 → Cut-Extrude15 (cut)
    with BuildSketch(Plane(origin=(0, 0, 0), x_dir=(0, 0, -1), z_dir=(1, 0, 0))):
        with Locations((0, 13.943670675)):
            Circle(SKETCH39_R)
        with Locations((0, -13.943670675)):
            Circle(SKETCH39_R)
    extrude(amount=CUT_EXTRUDE15_DEPTH, mode=Mode.SUBTRACT)

    # Sketch41 → Boss-Extrude8 (add)
    with BuildSketch(Plane(origin=(0, 7.5, 0), x_dir=(1, 0, 0), z_dir=(0, 1, 0))):
        with BuildLine():
            Line((1.5, -6.25), (-1.5, -6.25))
            Line((-1.5, -6.25), (-1.5, -9.886859967))
            ThreePointArc((-1.5, -9.886859967), (0, -10), (1.5, -9.886859967))
            Line((1.5, -9.886859967), (1.5, -6.25))
        make_face()
    boss_extrude8 = extrude(amount=BOSS_EXTRUDE8_DEPTH)

    # Mirror6: Boss-Extrude8 across plane
    add(boss_extrude8.mirror(Plane.ZX))

    # Sketch42 → Cut-Extrude16 (cut, through all)
    with BuildSketch(Plane(origin=(0, 12.5, 0), x_dir=(1, 0, 0), z_dir=(0, 1, 0))):
        with Locations((11.25, 0)):
            Circle(SKETCH42_R)
    cut_extrude16 = extrude(amount=-CUT_EXTRUDE16_DEPTH, mode=Mode.SUBTRACT)

    # Mirror7: Cut-Extrude16 across plane
    add(cut_extrude16.mirror(Plane(origin=(0, 0, 0), x_dir=(0, 0, 1), z_dir=(1, 0, 0))), mode=Mode.SUBTRACT)


solid = part.part
